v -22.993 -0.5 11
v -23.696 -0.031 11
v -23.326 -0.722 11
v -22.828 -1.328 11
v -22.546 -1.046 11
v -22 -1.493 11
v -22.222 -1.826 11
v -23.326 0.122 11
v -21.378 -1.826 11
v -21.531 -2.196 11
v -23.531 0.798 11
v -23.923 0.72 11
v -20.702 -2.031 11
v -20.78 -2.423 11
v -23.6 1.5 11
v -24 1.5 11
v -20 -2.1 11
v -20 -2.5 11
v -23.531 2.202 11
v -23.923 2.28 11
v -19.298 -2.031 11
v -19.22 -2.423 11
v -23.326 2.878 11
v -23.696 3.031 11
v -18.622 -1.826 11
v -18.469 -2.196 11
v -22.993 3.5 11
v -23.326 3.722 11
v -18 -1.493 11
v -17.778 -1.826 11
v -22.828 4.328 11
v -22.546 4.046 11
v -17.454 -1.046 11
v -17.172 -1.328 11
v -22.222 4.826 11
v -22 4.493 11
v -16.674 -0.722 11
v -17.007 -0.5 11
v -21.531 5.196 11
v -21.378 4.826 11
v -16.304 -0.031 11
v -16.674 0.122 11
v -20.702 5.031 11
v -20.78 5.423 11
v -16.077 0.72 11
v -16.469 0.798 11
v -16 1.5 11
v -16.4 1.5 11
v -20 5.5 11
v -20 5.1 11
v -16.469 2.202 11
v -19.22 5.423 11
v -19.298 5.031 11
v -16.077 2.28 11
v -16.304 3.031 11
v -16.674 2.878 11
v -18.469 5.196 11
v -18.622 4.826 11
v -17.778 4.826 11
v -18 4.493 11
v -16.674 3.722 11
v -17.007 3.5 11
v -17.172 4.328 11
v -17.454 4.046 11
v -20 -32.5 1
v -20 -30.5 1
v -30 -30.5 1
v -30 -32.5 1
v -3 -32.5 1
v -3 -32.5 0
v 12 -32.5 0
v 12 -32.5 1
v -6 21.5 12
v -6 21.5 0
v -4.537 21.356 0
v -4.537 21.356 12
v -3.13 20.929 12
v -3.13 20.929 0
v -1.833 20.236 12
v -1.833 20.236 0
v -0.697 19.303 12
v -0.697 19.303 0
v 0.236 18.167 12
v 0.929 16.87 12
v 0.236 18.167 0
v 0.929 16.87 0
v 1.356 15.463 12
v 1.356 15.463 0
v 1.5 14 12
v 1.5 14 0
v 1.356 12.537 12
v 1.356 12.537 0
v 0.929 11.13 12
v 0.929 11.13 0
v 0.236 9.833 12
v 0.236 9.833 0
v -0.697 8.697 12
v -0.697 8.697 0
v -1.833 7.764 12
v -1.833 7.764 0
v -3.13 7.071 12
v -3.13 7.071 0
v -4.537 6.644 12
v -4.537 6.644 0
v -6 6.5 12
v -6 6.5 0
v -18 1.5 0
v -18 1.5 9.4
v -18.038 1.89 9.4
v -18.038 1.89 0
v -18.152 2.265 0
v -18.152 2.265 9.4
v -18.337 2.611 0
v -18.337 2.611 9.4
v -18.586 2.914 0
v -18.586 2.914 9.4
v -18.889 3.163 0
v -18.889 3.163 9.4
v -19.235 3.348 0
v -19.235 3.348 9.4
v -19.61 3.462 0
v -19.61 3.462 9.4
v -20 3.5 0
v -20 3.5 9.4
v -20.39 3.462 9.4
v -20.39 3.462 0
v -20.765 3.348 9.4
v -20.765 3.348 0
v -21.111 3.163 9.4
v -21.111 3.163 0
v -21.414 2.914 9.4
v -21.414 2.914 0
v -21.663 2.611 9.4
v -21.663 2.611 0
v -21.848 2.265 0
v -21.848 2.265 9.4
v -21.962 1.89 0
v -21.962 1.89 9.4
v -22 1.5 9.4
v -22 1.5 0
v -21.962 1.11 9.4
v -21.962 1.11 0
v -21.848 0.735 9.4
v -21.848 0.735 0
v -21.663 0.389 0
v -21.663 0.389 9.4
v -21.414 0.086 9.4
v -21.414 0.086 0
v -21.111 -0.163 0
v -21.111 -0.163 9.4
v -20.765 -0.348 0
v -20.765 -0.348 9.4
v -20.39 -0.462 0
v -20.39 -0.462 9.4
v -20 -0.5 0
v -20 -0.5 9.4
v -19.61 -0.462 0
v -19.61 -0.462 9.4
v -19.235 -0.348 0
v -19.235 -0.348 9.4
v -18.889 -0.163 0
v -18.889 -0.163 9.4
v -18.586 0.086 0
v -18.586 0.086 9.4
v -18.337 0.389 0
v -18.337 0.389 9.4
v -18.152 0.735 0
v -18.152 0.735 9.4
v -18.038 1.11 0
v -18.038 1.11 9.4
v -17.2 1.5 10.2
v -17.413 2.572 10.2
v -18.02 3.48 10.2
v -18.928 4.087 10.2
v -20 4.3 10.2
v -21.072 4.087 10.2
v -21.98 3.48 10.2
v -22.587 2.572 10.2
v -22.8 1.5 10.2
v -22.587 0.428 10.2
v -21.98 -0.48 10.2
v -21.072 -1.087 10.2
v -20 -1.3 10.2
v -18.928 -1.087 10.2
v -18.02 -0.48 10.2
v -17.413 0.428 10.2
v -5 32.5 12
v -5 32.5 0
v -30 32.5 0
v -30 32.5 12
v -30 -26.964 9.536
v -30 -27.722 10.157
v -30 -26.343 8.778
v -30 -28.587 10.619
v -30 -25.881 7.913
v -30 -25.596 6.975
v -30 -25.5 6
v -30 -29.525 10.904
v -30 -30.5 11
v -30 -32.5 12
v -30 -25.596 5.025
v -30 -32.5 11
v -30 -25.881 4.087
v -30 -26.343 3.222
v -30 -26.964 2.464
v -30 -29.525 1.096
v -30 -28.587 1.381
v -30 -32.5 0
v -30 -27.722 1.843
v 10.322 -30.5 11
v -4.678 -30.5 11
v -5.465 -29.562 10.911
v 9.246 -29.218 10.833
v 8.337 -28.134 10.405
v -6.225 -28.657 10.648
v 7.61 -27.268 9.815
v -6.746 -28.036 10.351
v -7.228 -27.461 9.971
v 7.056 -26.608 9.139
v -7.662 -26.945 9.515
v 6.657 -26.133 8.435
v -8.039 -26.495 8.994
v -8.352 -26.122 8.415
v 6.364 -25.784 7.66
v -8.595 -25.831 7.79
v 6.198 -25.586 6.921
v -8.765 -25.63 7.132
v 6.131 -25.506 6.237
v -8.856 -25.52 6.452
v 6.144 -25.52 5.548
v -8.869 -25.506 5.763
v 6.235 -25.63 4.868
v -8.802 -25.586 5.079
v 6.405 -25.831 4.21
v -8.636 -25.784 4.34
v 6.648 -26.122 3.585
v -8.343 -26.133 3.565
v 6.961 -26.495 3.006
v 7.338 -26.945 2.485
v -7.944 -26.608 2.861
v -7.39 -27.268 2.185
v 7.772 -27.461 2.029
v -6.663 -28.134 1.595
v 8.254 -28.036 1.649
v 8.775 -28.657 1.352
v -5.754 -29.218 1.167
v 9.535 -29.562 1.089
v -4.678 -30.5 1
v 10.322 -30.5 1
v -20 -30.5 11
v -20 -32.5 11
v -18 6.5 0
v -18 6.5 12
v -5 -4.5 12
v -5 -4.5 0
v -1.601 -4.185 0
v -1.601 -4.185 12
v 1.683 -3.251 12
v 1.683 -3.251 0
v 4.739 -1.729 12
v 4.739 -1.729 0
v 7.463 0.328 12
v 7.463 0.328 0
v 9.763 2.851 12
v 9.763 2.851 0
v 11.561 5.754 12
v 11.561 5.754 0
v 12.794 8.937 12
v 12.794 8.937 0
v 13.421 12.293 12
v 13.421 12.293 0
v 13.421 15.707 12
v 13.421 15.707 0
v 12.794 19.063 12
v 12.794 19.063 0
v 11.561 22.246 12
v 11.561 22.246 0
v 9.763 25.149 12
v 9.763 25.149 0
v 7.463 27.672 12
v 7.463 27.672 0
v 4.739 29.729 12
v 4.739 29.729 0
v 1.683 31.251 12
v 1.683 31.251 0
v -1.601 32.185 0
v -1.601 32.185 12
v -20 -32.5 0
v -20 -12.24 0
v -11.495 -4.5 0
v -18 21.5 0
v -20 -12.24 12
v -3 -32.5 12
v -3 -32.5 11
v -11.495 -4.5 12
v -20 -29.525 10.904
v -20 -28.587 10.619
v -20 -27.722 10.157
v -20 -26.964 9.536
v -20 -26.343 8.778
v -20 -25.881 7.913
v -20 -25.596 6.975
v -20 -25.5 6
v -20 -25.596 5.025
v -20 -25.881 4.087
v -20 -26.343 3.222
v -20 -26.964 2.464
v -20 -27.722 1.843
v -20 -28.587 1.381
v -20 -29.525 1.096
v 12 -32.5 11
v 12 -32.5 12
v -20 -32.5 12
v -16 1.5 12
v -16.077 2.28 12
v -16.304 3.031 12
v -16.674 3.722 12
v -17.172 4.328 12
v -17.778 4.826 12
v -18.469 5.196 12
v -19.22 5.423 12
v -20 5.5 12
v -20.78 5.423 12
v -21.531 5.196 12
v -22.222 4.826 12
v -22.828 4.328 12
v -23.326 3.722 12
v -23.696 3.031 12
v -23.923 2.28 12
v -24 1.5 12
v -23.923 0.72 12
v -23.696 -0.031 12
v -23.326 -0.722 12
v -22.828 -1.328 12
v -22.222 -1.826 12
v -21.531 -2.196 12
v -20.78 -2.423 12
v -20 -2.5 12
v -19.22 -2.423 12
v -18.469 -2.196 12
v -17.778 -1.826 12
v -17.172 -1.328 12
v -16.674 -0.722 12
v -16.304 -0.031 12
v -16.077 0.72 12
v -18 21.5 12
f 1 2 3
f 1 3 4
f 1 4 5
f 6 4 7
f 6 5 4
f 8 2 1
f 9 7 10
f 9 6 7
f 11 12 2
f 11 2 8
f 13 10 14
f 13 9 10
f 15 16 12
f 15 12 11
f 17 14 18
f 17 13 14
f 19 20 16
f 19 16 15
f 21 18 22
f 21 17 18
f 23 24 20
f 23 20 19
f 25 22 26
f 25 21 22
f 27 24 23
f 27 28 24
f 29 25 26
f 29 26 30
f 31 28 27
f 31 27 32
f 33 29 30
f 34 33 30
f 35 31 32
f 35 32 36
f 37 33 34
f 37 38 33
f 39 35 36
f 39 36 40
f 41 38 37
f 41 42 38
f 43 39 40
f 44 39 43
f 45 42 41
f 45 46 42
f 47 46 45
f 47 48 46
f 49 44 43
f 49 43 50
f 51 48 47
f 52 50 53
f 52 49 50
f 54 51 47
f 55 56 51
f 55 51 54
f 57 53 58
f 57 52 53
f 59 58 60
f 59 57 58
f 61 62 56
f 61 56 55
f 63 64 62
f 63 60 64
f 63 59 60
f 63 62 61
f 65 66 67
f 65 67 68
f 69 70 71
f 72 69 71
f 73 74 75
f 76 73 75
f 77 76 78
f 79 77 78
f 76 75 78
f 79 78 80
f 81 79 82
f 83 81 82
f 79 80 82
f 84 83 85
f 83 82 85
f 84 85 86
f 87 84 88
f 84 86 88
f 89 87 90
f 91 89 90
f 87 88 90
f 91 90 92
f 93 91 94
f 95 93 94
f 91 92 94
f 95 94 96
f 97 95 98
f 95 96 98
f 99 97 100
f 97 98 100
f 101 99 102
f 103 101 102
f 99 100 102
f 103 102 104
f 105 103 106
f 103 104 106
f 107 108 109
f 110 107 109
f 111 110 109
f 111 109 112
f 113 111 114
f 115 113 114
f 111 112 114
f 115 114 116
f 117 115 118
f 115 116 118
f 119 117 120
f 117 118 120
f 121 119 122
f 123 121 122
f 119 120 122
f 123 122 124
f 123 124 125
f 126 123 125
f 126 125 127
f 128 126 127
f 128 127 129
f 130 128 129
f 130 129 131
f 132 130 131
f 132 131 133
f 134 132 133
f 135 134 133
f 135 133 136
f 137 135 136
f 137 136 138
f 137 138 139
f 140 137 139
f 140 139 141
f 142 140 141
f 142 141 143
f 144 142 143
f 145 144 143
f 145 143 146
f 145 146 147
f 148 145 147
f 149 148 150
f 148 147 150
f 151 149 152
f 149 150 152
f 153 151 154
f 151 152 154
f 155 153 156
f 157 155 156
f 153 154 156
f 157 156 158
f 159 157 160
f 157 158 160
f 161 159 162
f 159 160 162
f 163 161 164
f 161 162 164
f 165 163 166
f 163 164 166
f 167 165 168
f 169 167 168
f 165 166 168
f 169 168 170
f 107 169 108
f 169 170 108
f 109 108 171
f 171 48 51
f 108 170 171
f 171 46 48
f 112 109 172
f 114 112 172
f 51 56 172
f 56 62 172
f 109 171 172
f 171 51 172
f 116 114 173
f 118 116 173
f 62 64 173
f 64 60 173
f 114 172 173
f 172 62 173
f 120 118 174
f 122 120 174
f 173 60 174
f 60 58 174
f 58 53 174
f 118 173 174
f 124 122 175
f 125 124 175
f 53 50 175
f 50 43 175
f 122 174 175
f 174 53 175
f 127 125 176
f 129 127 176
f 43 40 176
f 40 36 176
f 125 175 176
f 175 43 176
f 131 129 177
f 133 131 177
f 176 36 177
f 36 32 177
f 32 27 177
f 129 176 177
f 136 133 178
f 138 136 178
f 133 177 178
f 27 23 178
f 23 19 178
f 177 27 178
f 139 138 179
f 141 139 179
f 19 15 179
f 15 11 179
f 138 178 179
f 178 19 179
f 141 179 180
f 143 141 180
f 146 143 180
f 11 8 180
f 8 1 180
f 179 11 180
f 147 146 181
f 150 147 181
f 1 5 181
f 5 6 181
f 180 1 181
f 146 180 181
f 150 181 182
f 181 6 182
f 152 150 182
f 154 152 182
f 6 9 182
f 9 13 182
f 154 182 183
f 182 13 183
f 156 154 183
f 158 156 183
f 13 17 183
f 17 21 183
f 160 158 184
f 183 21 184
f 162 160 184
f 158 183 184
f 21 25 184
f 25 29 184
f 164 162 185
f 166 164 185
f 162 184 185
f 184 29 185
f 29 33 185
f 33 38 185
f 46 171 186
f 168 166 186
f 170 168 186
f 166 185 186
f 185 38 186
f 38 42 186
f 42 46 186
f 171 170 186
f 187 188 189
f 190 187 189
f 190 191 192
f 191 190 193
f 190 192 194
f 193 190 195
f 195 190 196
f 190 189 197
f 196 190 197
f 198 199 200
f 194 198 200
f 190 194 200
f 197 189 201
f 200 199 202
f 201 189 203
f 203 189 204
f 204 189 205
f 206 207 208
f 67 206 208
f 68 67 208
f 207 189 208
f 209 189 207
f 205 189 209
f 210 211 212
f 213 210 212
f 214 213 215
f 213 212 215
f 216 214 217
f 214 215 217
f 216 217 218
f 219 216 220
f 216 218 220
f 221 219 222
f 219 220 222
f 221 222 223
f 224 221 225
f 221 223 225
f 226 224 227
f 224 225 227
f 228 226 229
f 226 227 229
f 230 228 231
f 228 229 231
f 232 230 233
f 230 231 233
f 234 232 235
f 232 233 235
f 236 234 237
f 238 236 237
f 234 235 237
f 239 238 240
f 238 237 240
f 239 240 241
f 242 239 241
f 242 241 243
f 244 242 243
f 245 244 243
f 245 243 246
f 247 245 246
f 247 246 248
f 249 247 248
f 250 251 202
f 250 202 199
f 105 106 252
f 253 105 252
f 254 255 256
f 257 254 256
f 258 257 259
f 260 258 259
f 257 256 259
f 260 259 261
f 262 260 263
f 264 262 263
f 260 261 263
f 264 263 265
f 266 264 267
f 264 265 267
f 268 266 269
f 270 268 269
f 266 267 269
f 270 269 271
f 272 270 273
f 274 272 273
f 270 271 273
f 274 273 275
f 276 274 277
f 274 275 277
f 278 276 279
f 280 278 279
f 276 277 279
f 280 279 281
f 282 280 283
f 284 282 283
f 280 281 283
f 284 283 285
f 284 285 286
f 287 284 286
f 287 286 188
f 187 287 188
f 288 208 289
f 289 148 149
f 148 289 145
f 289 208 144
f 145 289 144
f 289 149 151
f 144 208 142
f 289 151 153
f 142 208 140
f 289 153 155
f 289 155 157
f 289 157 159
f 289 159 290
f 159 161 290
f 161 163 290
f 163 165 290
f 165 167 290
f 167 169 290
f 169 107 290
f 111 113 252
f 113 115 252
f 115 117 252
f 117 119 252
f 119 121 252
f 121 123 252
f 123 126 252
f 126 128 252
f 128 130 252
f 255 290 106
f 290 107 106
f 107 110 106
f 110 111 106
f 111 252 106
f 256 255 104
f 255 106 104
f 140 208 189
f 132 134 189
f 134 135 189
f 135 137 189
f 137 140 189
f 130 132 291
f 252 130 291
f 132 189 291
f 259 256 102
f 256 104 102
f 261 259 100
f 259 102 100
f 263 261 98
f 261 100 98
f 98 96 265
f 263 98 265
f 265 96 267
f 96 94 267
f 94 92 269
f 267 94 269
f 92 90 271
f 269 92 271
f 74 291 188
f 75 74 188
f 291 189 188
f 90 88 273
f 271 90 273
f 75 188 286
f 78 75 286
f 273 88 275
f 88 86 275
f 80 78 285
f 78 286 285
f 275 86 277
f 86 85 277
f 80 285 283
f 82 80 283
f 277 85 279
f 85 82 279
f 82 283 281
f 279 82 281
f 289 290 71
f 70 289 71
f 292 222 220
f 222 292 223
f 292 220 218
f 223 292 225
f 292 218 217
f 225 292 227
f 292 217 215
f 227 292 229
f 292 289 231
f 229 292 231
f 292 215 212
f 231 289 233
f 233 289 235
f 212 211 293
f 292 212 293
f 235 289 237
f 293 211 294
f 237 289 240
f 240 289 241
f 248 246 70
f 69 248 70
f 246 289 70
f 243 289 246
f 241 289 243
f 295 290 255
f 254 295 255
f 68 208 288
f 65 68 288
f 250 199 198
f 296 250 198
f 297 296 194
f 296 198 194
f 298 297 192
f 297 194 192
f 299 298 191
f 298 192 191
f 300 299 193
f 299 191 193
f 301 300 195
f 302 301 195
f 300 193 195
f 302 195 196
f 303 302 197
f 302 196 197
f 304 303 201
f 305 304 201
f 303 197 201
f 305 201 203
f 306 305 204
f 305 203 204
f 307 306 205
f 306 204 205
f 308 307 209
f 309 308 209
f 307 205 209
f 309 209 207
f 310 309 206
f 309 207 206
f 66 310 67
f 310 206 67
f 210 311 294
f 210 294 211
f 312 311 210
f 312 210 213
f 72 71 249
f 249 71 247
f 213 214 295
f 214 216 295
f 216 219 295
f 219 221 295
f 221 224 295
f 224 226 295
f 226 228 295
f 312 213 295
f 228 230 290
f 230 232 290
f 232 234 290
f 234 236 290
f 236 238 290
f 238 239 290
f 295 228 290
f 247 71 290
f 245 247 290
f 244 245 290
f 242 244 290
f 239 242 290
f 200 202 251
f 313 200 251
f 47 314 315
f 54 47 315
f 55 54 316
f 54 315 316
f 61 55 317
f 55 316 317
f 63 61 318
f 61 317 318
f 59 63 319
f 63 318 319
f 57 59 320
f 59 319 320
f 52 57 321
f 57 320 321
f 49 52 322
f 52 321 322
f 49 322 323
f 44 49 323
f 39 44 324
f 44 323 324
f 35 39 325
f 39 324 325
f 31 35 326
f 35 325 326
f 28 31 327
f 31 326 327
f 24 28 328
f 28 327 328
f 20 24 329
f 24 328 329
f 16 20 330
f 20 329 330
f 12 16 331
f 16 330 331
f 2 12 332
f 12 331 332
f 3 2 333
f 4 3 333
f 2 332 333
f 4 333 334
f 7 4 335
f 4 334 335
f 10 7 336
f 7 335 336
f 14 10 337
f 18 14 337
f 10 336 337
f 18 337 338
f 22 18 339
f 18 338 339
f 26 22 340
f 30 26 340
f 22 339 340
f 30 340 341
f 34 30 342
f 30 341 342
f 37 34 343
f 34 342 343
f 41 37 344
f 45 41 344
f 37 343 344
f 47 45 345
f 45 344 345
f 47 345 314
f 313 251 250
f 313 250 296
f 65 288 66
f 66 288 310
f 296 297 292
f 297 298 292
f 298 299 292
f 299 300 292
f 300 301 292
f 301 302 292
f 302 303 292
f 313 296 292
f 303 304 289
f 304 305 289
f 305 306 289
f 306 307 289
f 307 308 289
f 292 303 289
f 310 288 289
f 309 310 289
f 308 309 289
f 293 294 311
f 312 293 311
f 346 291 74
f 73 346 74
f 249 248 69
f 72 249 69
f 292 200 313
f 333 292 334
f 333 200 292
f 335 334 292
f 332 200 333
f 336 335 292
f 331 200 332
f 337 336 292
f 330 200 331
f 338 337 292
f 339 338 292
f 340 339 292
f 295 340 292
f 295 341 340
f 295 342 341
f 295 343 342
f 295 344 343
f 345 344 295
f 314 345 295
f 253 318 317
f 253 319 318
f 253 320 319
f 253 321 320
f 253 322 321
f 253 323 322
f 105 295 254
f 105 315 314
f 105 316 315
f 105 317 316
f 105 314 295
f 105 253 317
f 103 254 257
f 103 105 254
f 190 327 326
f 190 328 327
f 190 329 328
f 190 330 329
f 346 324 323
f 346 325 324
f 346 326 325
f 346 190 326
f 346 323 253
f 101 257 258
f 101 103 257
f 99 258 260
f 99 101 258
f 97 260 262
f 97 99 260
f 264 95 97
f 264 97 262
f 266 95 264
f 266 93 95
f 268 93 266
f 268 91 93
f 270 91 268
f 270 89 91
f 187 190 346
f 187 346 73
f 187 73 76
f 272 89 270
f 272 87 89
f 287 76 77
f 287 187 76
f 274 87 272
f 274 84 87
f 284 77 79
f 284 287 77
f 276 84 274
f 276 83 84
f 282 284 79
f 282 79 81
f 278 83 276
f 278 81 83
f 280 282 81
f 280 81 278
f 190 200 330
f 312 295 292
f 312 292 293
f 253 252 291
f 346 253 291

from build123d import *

# Parameters (mm, degrees)
F1_DEPTH = 12
F3_DEPTH = 43.501
F4_R     = 2
F5_DEPTH = 12.001
F6_R     = 4
F7_DEPTH = 1
F8_SIZE  = 1.6


with BuildPart() as f1:
    # F0 (on Top) → F1 (new body)
    with BuildSketch(Plane.XY):
        with BuildLine():
            Line((-5, 32.5), (-30, 32.5))
            Line((-30, 32.5), (-30, -32.5))
            Line((-30, -32.5), (-20, -32.5))
            Line((-20, -32.5), (-20, -12.24))
            Line((-20, -12.24), (-3, -32.5))
            Line((-3, -32.5), (12, -32.5))
            Line((12, -32.5), (-11.494571, -4.5))
            Line((-11.494571, -4.5), (-5, -4.5))
            ThreePointArc((-5, -4.5), (13.5, 14), (-5, 32.5))
        make_face()
        with BuildLine():
            Line((-18, 6.5), (-18, 21.5))
            Line((-18, 21.5), (-6, 21.5))
            ThreePointArc((-6, 21.5), (1.5, 14), (-6, 6.5))
            Line((-6, 6.5), (-18, 6.5))
        make_face(mode=Mode.SUBTRACT)
    extrude(amount=F1_DEPTH)

    # F2 (on face) → F3 (cut, through all)
    with BuildSketch(Plane(origin=(-30, 0, 0), x_dir=(0, -1, 0), z_dir=(-1, 0, 0))):
        with BuildLine():
            Line((32.5, 11), (30.5, 11))
            ThreePointArc((30.5, 11), (25.5, 6), (30.5, 1))
            Line((30.5, 1), (32.5, 1))
            Line((32.5, 1), (32.5, 11))
        make_face()
    extrude(amount=-F3_DEPTH, mode=Mode.SUBTRACT)

    # F4 (on face) → F5 (cut, through all)
    with BuildSketch(Plane.XY.offset(12)):
        with Locations((-20, 1.5)):
            Circle(F4_R)
    extrude(amount=-F5_DEPTH, mode=Mode.SUBTRACT)

    # F6 (on face) → F7 (cut)
    with BuildSketch(Plane.XY.offset(12)):
        with Locations((-20, 1.5)):
            Circle(F6_R)
    extrude(amount=-F7_DEPTH, mode=Mode.SUBTRACT)

    # F8
    f8_edges = [f1.edges().sort_by_distance(p)[0] for p in [
        (-22, 1.5, 11),
    ]]
    chamfer(f8_edges, length=F8_SIZE)


solid = f1.part
